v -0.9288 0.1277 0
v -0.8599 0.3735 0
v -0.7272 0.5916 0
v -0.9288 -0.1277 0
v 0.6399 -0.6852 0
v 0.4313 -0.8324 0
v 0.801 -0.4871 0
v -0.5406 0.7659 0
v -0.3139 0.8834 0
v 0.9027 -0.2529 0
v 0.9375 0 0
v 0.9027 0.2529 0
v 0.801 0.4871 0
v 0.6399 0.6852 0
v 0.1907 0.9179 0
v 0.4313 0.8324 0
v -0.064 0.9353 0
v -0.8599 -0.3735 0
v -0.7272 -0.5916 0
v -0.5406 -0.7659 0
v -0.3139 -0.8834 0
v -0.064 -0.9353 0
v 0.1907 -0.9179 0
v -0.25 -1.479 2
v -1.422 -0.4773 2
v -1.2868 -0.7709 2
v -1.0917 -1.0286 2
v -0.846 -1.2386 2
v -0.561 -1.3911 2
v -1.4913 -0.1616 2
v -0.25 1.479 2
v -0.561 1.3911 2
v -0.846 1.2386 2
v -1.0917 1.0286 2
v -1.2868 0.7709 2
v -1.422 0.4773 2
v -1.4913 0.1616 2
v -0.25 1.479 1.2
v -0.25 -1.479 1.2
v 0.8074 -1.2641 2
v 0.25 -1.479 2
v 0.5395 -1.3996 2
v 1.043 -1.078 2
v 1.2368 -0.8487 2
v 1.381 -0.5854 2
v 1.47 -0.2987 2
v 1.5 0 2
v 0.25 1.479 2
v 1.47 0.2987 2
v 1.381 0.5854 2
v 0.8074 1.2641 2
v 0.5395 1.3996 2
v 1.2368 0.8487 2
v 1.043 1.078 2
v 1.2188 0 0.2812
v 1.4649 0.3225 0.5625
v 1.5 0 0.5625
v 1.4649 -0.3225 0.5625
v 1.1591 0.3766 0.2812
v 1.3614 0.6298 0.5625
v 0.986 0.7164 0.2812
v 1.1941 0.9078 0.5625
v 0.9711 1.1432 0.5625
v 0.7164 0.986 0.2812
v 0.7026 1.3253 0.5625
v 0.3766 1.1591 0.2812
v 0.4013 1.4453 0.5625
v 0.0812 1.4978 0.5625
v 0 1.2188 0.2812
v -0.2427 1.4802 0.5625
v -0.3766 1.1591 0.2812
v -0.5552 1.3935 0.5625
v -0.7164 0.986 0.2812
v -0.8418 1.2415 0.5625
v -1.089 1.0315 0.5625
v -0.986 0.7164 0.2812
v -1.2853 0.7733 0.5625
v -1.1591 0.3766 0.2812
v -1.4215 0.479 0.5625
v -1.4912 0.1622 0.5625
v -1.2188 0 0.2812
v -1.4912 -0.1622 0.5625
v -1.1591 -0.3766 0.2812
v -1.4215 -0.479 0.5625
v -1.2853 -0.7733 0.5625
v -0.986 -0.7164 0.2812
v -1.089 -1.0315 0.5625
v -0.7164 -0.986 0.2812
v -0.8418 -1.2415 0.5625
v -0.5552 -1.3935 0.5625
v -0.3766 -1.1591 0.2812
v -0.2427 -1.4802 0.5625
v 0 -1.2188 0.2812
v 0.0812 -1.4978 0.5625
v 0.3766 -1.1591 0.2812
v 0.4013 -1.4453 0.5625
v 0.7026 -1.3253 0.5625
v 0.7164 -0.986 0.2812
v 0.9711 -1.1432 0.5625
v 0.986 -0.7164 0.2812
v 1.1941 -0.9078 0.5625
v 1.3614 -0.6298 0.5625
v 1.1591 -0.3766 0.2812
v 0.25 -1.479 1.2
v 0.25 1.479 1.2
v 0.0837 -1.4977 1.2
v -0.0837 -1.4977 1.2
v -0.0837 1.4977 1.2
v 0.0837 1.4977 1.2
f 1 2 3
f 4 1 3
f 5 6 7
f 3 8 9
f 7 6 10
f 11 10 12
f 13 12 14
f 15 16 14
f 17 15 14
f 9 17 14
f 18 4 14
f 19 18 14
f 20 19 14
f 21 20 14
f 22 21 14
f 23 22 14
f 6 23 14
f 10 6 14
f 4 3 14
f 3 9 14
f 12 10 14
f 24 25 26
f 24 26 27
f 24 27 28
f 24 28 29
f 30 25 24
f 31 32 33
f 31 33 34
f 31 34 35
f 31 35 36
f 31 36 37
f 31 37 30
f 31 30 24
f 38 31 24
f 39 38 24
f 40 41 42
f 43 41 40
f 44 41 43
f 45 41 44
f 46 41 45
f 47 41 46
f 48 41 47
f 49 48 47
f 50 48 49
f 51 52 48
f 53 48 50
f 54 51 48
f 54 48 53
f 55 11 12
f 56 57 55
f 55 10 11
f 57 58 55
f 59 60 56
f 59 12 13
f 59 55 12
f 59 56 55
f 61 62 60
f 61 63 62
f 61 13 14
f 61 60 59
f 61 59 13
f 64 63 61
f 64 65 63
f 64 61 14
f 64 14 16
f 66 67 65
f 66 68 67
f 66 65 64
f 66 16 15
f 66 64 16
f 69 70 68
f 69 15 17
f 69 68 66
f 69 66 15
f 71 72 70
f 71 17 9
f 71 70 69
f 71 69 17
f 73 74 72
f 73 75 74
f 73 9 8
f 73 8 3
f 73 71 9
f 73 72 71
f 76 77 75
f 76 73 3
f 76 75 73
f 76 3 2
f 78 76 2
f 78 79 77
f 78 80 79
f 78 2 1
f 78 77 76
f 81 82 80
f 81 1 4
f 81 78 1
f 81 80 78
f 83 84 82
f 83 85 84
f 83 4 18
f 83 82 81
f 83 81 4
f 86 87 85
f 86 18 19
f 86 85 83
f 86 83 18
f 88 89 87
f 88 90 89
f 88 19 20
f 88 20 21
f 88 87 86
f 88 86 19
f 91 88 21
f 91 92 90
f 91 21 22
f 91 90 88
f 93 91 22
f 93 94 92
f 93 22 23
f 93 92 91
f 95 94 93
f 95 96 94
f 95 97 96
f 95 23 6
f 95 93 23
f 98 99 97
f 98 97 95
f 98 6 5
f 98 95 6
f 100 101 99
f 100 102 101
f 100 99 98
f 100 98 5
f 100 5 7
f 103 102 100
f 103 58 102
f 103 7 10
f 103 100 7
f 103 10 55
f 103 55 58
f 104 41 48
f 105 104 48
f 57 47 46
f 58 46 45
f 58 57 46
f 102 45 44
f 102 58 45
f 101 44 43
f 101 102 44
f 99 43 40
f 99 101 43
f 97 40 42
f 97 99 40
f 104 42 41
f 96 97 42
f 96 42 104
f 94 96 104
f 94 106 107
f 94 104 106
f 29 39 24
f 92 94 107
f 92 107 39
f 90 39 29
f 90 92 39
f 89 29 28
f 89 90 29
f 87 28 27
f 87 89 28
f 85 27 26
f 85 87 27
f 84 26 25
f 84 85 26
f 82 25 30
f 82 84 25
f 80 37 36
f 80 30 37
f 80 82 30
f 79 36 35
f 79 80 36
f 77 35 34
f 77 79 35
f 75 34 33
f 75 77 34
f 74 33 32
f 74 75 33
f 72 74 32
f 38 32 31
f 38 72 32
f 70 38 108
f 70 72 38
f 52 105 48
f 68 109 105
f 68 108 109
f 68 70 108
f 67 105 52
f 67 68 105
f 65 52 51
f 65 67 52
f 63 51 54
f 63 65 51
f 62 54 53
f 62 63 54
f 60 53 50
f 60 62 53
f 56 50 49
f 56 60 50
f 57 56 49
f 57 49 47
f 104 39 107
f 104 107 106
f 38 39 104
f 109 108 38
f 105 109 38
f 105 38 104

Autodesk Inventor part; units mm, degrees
ref_plane "YZ Plane" through (0, 0, 0) normal (1, 0, 0) x (0, 1, 0)
ref_plane "XZ Plane" through (0, 0, 0) normal (0, 1, 0) x (-1, 0, 0)
ref_plane "XY Plane" through (0, 0, 0) normal (0, 0, 1) x (1, 0, 0)
sketch "スケッチ1" plane through (0, 0, 0) normal (0, 0, 1) x (1, 0, 0)
  circle A0 centre (0, 0) radius 1.5
  dimension "d0" = 3
extrude "押し出し1" add sketch "スケッチ1" along normal blind 2
chamfer "面取り1" distance 0.5625 angle 45 1 edges at (-1.5, 0, 0)
thread "ねじ1" size "M3x0.5" class "6g" standard "ANSI Metric M Profile" full length
sketch "スケッチ2" plane through (0, 0, 2) normal (0, 0, 1) x (1, 0, 0)
  circle A0 centre (0, 0) radius 1.5 projected
  line L0 (-0.25, 1.479) -> (-0.25, -1.479)
  line L1 (0.25, -1.479) -> (0.25, 1.479)
  dimension "d8" = 0.25
  dimension "d9" = 0.25
extrude "押し出し2" cut sketch "スケッチ2" against normal blind 0.8 contours L1 A0 L0
equation "\"d9\" = d8"
properties part number "ネジ止めm3,02" material "鋼、高強度、低合金"
